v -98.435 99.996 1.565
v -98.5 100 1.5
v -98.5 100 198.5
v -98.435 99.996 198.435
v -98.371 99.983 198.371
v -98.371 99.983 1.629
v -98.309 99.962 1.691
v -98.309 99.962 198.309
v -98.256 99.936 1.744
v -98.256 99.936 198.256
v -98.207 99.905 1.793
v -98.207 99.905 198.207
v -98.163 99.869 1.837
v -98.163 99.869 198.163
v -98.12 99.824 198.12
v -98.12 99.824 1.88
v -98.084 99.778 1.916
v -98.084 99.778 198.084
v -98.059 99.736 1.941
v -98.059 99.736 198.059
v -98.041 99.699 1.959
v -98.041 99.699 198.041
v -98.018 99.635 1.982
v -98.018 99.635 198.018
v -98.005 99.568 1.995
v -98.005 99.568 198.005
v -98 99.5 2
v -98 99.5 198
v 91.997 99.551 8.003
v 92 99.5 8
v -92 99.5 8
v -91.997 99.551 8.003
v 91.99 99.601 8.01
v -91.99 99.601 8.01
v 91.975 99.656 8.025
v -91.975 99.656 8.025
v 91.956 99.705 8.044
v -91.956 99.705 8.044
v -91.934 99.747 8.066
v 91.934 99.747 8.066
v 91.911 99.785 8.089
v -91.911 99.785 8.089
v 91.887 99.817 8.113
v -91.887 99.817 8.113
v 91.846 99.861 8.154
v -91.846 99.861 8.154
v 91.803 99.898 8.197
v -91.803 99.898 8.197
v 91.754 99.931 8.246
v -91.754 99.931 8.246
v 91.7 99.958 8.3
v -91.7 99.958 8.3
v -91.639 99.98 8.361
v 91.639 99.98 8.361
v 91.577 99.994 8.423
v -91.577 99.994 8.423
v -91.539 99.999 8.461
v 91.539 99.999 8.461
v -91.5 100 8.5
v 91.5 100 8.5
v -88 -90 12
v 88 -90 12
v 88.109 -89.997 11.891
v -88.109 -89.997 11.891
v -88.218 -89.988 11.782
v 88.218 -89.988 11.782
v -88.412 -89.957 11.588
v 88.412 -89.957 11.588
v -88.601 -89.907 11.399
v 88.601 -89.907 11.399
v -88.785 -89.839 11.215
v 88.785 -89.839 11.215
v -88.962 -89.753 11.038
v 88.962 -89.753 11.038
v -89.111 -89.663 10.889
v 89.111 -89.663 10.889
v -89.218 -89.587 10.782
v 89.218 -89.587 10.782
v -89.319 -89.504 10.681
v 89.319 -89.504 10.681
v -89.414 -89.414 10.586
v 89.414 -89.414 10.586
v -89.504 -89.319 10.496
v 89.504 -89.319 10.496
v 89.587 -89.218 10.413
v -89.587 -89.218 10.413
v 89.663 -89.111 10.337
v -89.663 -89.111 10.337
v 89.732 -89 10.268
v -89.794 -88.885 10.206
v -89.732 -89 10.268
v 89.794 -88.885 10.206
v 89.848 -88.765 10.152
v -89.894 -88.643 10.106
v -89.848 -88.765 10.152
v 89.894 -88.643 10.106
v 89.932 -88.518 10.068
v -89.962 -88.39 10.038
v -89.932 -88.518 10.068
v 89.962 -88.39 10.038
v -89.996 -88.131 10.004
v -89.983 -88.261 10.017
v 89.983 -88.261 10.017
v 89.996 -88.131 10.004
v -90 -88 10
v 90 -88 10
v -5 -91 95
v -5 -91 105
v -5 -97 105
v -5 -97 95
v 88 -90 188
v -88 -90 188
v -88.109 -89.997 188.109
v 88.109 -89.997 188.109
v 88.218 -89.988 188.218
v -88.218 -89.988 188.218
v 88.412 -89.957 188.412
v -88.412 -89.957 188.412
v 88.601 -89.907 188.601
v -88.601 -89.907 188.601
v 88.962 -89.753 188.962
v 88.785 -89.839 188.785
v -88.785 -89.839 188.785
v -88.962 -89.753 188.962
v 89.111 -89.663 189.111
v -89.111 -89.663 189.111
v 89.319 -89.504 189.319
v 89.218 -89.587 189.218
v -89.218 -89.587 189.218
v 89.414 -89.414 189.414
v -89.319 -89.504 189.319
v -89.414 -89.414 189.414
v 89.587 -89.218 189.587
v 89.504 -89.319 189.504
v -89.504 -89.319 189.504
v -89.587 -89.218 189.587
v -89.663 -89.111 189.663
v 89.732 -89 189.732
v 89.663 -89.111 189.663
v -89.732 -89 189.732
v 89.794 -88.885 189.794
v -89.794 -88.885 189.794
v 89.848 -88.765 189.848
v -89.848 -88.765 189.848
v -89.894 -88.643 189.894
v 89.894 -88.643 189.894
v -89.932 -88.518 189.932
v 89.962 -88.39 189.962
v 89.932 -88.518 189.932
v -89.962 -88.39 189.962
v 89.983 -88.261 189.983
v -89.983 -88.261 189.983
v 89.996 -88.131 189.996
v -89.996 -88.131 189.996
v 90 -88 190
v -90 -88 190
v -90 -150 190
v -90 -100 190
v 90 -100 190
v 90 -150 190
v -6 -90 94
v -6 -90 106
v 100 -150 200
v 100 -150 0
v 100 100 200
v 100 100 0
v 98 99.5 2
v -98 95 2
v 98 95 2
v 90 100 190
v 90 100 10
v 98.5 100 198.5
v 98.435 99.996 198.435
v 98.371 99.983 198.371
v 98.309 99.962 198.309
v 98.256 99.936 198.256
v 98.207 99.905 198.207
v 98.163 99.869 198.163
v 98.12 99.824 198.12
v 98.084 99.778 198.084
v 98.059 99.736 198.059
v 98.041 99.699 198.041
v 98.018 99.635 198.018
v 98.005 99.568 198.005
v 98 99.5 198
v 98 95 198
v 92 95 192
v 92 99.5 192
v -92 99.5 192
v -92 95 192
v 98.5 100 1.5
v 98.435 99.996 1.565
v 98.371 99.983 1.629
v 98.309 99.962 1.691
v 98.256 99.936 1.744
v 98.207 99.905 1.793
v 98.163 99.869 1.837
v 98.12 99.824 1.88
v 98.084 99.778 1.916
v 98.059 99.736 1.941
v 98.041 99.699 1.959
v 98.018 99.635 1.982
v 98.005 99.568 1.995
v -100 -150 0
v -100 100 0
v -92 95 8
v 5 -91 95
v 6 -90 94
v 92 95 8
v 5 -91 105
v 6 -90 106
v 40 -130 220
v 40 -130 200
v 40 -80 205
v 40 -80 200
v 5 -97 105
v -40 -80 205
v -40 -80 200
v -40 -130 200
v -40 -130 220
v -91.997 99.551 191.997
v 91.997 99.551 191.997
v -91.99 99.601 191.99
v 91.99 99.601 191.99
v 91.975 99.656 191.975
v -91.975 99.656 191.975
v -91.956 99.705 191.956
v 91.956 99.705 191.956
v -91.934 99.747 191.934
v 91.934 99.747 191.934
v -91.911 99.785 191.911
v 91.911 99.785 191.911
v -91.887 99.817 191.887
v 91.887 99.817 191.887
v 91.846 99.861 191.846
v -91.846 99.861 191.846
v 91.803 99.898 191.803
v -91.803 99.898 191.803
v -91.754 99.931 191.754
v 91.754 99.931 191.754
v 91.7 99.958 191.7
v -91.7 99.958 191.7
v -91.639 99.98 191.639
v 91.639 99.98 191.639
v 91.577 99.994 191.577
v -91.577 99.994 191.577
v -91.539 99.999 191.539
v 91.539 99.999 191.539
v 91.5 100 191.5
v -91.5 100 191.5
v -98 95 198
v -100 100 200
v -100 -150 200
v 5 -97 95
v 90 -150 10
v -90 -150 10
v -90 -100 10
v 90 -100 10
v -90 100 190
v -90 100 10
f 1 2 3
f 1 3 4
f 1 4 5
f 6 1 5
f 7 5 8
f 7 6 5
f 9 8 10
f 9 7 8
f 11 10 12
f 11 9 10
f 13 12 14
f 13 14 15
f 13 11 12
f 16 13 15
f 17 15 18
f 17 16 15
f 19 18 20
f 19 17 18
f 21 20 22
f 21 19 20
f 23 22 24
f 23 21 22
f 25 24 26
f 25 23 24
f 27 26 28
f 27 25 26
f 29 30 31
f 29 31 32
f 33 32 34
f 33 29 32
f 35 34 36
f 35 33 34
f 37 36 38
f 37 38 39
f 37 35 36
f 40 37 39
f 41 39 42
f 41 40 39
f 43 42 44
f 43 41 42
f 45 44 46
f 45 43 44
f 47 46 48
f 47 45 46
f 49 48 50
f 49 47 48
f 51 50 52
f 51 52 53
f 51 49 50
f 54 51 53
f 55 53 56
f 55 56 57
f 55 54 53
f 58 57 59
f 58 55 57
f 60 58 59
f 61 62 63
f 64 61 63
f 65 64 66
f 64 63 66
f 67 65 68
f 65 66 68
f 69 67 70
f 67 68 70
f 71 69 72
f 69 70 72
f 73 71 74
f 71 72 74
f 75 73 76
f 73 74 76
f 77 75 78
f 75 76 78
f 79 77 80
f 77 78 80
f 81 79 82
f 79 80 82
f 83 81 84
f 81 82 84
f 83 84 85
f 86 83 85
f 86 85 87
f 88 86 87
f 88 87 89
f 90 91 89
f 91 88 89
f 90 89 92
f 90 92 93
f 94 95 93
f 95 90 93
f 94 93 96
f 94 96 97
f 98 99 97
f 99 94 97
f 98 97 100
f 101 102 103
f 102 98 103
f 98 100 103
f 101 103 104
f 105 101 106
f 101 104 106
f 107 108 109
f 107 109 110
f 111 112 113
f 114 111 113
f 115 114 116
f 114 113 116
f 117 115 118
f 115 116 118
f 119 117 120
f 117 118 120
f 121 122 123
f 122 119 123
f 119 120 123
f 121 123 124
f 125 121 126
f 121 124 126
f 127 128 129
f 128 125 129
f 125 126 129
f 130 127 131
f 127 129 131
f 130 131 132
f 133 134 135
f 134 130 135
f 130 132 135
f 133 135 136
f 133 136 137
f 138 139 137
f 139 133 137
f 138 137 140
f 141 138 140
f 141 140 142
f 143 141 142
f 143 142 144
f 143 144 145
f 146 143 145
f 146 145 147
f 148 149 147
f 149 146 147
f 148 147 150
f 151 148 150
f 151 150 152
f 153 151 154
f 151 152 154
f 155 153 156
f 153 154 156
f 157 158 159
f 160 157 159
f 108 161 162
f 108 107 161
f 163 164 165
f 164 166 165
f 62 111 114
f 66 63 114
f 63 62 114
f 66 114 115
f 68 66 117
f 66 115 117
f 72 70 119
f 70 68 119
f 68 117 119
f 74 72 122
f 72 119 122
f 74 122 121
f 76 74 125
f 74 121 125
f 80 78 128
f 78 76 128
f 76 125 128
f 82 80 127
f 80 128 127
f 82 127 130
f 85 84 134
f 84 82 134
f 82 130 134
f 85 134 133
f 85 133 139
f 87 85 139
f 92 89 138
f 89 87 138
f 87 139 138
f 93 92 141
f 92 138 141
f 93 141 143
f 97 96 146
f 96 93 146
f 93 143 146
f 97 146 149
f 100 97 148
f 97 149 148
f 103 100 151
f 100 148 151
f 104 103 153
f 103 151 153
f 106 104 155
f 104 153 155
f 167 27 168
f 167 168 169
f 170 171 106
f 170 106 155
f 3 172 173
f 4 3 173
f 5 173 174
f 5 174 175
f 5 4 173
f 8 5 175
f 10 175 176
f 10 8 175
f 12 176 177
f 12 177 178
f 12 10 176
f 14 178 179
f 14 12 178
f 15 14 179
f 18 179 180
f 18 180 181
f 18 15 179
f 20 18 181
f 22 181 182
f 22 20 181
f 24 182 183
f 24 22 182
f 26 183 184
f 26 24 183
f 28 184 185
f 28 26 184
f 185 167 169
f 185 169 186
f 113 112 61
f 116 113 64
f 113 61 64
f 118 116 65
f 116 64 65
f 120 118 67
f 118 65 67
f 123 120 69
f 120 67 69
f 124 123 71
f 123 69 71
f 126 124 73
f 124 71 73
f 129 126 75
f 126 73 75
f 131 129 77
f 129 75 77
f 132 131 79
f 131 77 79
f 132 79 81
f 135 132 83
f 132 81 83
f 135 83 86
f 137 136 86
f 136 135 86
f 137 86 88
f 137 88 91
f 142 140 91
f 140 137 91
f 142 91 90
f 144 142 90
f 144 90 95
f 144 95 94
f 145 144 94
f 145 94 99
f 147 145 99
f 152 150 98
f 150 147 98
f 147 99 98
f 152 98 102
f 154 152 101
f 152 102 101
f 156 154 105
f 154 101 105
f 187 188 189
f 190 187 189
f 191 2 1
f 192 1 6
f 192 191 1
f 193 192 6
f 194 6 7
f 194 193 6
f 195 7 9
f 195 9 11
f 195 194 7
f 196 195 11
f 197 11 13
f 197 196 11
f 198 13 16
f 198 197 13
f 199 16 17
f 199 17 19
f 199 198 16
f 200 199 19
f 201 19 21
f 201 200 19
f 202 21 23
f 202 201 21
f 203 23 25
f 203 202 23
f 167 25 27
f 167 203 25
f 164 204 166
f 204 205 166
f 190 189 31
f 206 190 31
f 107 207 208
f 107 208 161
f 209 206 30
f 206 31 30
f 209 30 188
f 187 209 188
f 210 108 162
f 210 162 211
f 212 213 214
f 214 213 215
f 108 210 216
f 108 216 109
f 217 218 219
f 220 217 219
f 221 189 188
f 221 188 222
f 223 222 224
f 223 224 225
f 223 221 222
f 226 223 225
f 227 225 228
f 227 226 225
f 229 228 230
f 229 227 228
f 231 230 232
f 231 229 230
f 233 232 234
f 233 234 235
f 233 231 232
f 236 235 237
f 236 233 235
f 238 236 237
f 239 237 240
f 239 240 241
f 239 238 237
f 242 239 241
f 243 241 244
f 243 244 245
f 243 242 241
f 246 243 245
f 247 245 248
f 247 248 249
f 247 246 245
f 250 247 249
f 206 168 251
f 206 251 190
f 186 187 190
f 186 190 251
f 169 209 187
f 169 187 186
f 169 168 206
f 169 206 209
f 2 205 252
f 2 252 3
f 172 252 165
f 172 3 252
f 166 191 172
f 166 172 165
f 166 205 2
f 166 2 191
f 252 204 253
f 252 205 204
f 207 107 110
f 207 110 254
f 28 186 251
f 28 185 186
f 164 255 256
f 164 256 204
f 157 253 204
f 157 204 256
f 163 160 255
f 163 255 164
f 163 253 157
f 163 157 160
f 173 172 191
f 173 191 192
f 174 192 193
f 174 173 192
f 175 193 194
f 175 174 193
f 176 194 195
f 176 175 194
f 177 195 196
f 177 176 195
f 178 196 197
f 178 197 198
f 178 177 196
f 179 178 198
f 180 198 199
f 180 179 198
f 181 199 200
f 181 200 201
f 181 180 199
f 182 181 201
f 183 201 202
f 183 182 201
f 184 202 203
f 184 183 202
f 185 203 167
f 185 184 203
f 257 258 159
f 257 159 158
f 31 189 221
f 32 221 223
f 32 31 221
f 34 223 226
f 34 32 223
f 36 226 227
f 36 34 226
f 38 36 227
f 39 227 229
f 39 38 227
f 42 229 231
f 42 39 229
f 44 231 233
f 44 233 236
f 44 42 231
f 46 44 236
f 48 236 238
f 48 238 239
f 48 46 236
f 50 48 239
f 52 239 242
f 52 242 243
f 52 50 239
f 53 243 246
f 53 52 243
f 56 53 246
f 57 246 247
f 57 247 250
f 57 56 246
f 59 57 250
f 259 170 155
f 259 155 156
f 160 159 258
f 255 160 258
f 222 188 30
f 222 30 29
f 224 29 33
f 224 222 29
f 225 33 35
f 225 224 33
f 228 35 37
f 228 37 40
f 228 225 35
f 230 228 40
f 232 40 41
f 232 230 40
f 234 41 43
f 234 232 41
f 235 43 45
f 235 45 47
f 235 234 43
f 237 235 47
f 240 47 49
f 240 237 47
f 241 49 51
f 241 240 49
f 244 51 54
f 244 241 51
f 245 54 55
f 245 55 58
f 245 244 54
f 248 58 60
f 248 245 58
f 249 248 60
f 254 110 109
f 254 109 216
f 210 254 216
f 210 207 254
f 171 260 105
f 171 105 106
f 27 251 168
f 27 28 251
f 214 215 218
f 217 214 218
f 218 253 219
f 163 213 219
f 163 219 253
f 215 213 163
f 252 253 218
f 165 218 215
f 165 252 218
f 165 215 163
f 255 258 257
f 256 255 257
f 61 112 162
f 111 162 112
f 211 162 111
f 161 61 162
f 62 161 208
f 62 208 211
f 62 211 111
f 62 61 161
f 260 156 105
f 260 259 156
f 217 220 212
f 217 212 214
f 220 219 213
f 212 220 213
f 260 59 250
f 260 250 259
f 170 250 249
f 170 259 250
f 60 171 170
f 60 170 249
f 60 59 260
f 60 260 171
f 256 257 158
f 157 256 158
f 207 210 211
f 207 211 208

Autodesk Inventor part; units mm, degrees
ref_plane "YZ Plane" through (0, 0, 0) normal (1, 0, 0) x (0, 1, 0)
ref_plane "XZ Plane" through (0, 0, 0) normal (0, 1, 0) x (-1, 0, 0)
ref_plane "XY Plane" through (0, 0, 0) normal (0, 0, 1) x (1, 0, 0)
sketch "Skizze1" plane through (0, 0, 0) normal (0, 0, 1) x (1, 0, 0)
  line L0 (-140, 0) -> (140, 0) projected
  line L1 (0, -140) -> (0, 140) projected
  line L2 (-100, 100) -> (100, 100)
  line L3 (100, 100) -> (100, -100)
  line L4 (100, -100) -> (-100, -100)
  line L5 (-100, -100) -> (-100, 100)
  point P0 (0, 0)
  dimension "d0" = 200
  dimension "d1" = 200
  dimension "d2" = 100
  dimension "d3" = 100
extrude "Extrusion1" add sketch "Skizze1" along normal blind 200
sketch "Skizze2" plane through (-100, 100, 0) normal (0, 1, 0) x (1, 0, 0)
  line L0 (10, -10) -> (190, -10)
  line L1 (190, -10) -> (190, -190)
  line L2 (190, -190) -> (10, -190)
  line L3 (10, -190) -> (10, -10)
  line L4 (0, 0) -> (0, -200) projected
  line L5 (200, 0) -> (200, -200) projected
  line L6 (200, -200) -> (0, -200) projected
  line L7 (200, 0) -> (0, 0) projected
  point P0 (100, 0)
  dimension "d6" = 10
  dimension "d7" = 10
  dimension "d8" = 10
  dimension "d9" = 10
extrude "Extrusion2" cut sketch "Skizze2" against normal blind 190 contours L0 L1 L2 L3
sketch "Skizze3" plane through (-100, 100, 0) normal (0, 1, 0) x (1, 0, 0)
  line L0 (2, -2) -> (198, -2)
  line L1 (198, -2) -> (198, -198)
  line L2 (198, -198) -> (2, -198)
  line L3 (2, -198) -> (2, -2)
  line L4 (8, -8) -> (192, -8)
  line L5 (192, -8) -> (192, -192)
  line L6 (192, -192) -> (8, -192)
  line L7 (8, -192) -> (8, -8)
  line L8 (0, 0) -> (0, -200) projected
  line L9 (10, -190) -> (10, -10) projected
  line L10 (190, -190) -> (10, -190) projected
  line L11 (200, -200) -> (0, -200) projected
  line L12 (190, -10) -> (190, -190) projected
  line L13 (200, 0) -> (200, -200) projected
  line L14 (200, 0) -> (0, 0) projected
  line L15 (10, -10) -> (190, -10) projected
  point P0 (100, 0)
  dimension "d12" = 2
  dimension "d13" = 2
  dimension "d14" = 2
  dimension "d15" = 2
  dimension "d16" = 2
  dimension "d17" = 2
  dimension "d18" = 2
  dimension "d19" = 2
extrude "Extrusion3" cut sketch "Skizze3" against normal blind 5 contours L0 L1 L2 L3
fillet "Rundung1" radius 0.5 8 edges at (0, 100, 2) (0, 100, 8) (98, 100, 100) (92, 100, 100) (0, 100, 192) (0, 100, 198) (-98, 100, 100) (-92, 100, 100)
sketch "Skizze5" plane through (-100, -90, 0) normal (0, 1, 0) x (1, 0, 0)
  line L0 (95, -95) -> (105, -95)
  line L1 (105, -95) -> (105, -105)
  line L2 (105, -105) -> (95, -105)
  line L3 (95, -105) -> (95, -95)
  line L4 (200, 0) -> (0, 0) projected
  line L5 (0, 0) -> (0, -200) projected
  point P0 (100, 0)
  dimension "d24" = 10
  dimension "d25" = 10
  dimension "d26" = 95
  dimension "d27" = 95
extrude "Extrusion4" cut sketch "Skizze5" against normal blind 7
sketch "Skizze6" plane through (-100, -100, 0) normal (0, -1, 0) x (1, 0, 0)
  line L0 (10, 190) -> (190, 190)
  line L1 (190, 190) -> (190, 10)
  line L2 (190, 10) -> (10, 10)
  line L3 (10, 10) -> (10, 190)
  line L4 (0, 200) -> (200, 200) projected
  line L5 (200, 0) -> (200, 200) projected
  line L6 (0, 0) -> (200, 0) projected
  line L7 (0, 0) -> (0, 200) projected
  point P0 (100, 0)
  dimension "d30" = 10
  dimension "d31" = 10
  dimension "d32" = 10
  dimension "d33" = 10
extrude "Extrusion5" add sketch "Skizze6" along normal blind 50
sketch "Skizze7" plane through (0, 0, 200) normal (0, 0, 1) x (1, 0, 0)
  line L0 (-40, -130) -> (40, -130)
  line L1 (40, -130) -> (40, -80)
  line L2 (40, -80) -> (-40, -80)
  line L3 (-40, -80) -> (-40, -130)
  line L4 (100, -150) -> (-100, -150) projected
  line L5 (-100, 100) -> (-100, -150) projected
  point P0 (0, 0)
  dimension "d36" = 50
  dimension "d37" = 80
  dimension "d38" = 20
  dimension "d39" = 60
extrude "Extrusion6" add sketch "Skizze7" along normal blind 20
sketch "Skizze9" plane through (-40, -130, 200) normal (-1, 0, 0) x (0, 0, 1)
  line L0 (20, 0) -> (20, 50) projected
  line L1 (20, 0) -> (5, 50)
  line L2 (0, 50) -> (20, 50) projected
  line L3 (0, 230) -> (0, -20) projected
  point P0 (-200, 130)
  dimension "d45" = 5
extrude "Extrusion7" cut sketch "Skizze9" against normal blind 200
fillet "Rundung2" radius 2 4 edges at (0, -90, 10) (90, -90, 100) (0, -90, 190) (-90, -90, 100)
chamfer "Fase1" distance 1 angle 45 4 edges at (0, -90, 95) (5, -90, 100) (0, -90, 105) (-5, -90, 100)
properties material "Acetalharz, Schwarz"
